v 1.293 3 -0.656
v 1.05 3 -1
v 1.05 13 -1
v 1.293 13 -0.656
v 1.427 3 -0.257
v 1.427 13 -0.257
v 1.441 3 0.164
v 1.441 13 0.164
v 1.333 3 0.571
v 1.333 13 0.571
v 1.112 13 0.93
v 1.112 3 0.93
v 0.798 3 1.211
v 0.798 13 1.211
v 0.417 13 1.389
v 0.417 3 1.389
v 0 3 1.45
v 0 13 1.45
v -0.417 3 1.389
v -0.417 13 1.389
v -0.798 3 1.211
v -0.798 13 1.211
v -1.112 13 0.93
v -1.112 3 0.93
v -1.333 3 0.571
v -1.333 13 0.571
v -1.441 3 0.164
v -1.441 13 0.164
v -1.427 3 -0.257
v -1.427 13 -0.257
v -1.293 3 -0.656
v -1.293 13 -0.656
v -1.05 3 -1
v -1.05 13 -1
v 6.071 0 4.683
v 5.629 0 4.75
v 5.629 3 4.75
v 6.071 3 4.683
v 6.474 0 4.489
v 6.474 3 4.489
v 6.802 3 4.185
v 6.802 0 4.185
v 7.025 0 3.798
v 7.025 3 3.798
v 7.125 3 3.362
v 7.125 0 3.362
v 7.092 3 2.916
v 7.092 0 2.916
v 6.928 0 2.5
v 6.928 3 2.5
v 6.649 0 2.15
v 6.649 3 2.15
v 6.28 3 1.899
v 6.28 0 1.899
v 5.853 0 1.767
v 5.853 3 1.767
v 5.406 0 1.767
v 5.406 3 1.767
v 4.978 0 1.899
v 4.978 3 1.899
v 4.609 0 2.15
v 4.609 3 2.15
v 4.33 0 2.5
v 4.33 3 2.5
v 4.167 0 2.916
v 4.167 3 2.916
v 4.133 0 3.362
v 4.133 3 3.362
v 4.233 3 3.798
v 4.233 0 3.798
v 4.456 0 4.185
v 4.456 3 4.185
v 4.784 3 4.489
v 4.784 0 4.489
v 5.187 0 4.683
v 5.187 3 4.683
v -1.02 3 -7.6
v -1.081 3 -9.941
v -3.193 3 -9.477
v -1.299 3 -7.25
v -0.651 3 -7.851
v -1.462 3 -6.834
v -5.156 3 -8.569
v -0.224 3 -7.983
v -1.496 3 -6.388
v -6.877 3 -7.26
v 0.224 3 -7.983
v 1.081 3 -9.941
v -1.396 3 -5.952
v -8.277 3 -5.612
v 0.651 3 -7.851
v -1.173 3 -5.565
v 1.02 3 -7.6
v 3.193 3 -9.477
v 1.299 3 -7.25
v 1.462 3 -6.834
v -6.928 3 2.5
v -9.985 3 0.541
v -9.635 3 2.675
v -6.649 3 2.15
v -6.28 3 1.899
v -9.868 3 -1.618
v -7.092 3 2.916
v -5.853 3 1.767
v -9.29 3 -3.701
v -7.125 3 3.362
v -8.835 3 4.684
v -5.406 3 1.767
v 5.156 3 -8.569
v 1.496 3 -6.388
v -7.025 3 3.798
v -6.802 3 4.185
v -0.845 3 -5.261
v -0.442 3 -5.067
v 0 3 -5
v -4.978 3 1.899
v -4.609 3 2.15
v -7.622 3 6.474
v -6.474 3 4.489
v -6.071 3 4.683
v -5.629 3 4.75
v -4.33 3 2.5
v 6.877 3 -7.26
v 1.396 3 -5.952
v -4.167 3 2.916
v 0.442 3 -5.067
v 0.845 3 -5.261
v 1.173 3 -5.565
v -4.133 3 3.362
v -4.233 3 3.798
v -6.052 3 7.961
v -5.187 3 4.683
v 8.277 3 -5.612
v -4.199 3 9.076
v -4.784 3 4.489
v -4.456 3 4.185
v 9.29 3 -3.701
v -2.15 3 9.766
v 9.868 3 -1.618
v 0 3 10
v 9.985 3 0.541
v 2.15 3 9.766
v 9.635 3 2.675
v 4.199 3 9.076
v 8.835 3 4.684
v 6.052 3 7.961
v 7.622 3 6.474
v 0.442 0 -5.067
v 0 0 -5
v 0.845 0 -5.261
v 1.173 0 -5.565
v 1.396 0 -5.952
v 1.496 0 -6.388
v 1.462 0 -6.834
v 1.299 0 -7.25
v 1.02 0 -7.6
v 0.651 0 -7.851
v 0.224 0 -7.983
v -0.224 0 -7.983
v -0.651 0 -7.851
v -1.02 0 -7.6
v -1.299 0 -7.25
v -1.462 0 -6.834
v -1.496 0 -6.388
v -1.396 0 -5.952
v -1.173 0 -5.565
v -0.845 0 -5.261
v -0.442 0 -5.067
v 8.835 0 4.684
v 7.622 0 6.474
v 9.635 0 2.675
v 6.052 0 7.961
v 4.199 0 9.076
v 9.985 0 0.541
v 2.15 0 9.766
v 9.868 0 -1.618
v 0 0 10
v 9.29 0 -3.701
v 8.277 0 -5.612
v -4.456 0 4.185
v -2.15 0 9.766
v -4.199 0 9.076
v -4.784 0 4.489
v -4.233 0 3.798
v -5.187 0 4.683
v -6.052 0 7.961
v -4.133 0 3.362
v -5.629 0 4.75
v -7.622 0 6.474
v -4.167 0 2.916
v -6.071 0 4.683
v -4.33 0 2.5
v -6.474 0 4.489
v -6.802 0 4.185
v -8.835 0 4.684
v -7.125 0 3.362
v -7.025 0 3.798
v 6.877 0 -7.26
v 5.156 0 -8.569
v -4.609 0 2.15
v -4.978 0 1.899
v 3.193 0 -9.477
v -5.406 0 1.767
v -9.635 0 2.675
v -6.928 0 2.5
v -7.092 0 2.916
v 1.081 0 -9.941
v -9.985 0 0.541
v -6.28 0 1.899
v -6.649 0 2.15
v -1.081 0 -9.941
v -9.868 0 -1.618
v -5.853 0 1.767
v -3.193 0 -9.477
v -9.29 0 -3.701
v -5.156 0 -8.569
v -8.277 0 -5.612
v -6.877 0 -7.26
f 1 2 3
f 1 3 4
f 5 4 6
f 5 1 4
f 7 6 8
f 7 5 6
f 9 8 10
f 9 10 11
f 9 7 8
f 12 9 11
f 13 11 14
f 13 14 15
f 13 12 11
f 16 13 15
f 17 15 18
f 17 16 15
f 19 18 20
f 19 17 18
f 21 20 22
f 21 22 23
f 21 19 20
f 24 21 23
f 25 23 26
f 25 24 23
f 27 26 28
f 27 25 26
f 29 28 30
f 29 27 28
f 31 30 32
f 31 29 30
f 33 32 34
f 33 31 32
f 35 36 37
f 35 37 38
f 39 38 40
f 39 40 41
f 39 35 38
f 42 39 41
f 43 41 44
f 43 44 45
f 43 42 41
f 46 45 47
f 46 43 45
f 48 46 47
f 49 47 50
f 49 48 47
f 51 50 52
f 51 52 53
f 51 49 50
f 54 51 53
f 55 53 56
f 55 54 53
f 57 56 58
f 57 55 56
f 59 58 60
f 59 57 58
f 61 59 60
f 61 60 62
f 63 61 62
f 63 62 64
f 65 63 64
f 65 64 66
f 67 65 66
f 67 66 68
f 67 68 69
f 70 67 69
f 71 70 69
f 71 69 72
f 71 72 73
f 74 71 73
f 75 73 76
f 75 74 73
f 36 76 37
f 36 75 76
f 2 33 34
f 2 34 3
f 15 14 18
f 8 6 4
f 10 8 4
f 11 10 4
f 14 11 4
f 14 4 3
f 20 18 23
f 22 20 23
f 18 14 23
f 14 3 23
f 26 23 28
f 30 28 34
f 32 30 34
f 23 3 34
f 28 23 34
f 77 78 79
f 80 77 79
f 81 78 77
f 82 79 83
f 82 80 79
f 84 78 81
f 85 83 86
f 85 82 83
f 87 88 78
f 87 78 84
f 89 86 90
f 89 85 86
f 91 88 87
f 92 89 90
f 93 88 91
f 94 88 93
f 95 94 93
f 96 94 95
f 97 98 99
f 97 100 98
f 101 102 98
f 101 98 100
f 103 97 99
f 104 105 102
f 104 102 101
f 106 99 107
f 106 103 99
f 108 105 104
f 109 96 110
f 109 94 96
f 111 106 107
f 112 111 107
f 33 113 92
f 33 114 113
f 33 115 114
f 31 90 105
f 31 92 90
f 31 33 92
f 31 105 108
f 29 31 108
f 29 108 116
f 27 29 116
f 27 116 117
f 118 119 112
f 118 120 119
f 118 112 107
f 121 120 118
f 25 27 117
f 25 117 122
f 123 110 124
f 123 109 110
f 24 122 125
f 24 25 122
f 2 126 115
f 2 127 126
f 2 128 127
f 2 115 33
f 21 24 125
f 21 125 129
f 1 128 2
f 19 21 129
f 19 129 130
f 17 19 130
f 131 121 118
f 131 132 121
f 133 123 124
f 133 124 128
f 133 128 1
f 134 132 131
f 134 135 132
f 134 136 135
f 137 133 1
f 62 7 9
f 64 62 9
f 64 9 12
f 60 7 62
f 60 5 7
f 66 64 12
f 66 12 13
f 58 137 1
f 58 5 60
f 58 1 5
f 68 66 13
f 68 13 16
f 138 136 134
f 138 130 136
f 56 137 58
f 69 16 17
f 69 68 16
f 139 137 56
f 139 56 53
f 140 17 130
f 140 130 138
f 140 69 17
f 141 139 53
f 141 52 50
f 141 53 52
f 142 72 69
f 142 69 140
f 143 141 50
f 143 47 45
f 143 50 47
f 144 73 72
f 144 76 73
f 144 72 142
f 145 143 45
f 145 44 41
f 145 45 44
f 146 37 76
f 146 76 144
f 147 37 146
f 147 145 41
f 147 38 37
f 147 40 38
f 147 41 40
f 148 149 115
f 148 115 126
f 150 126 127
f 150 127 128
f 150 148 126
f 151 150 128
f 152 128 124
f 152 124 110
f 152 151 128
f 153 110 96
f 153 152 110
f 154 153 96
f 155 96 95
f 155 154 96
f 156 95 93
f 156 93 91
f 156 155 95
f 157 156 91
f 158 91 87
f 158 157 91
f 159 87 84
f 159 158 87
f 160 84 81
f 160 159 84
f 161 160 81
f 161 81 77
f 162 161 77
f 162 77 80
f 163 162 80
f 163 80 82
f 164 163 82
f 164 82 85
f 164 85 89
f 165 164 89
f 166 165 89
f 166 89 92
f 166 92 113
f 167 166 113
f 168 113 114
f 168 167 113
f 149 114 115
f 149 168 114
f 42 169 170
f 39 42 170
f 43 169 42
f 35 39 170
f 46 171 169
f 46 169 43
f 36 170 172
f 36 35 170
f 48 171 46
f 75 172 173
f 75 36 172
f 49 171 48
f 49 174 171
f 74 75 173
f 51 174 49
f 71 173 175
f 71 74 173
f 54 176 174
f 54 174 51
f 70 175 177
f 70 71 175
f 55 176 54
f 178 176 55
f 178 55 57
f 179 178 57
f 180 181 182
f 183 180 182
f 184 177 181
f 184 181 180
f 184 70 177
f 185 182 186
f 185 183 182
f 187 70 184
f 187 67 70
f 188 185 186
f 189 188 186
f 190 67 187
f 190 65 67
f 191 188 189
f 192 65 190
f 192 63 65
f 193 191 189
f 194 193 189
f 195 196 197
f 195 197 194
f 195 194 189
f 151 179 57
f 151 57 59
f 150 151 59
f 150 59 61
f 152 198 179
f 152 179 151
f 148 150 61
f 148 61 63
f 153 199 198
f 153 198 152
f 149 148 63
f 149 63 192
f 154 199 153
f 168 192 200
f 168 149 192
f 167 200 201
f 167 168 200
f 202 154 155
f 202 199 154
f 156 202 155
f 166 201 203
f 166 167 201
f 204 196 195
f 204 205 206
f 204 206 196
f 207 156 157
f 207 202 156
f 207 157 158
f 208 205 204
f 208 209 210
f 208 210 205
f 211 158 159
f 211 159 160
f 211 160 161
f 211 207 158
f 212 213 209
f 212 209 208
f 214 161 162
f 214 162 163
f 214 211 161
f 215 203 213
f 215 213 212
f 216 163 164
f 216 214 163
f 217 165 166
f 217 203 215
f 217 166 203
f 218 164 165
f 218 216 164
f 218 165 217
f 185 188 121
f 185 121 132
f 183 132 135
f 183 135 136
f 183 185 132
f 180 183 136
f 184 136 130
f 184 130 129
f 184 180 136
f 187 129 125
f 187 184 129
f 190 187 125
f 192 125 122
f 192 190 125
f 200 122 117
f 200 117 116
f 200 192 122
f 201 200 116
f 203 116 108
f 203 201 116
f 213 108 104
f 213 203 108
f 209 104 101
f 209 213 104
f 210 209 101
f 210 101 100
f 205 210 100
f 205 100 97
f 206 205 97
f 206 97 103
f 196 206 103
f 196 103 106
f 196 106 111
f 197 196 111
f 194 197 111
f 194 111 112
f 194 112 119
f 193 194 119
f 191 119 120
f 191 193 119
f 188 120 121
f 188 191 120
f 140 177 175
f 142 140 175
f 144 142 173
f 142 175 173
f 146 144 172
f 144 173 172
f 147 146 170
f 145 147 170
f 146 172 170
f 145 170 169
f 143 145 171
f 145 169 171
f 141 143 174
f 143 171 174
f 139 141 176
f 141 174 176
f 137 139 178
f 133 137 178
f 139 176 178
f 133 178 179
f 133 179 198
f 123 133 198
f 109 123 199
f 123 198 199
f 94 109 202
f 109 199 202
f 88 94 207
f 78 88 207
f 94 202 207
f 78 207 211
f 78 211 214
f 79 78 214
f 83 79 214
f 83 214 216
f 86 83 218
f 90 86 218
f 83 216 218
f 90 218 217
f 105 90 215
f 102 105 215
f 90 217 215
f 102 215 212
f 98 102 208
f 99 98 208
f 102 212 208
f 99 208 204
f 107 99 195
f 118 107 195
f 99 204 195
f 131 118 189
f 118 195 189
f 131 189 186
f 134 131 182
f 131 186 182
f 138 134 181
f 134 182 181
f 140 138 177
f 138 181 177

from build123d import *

# Parameters (mm, degrees)
SKETCH_1_R      = 10
SKETCH_1_R_2    = 1.5
EXTRUDE_1_DEPTH = 3
EXTRUDE_2_DEPTH = 13


with BuildPart() as part:
    # 草图1 → 凸台-拉伸1 (new body)
    with BuildSketch(Plane(origin=(0, 0, 0), x_dir=(1, 0, 0), z_dir=(0, 1, 0))):
        with Locations(Location((0, 0, 0), (0, 0, 270))):
            Circle(SKETCH_1_R)
        with Locations(Location((0, 6.5, 0), (0, 0, 270))):
            Circle(SKETCH_1_R_2, mode=Mode.SUBTRACT)
        with Locations(Location((5.629165125, -3.25, 0), (0, 0, 270))):
            Circle(SKETCH_1_R_2, mode=Mode.SUBTRACT)
        with Locations(Location((-5.629165125, -3.25, 0), (0, 0, 270))):
            Circle(SKETCH_1_R_2, mode=Mode.SUBTRACT)
    extrude(amount=EXTRUDE_1_DEPTH)

    # 草图2 → 凸台-拉伸2 (add)
    with BuildSketch(Plane(origin=(0, 0, 0), x_dir=(1, 0, 0), z_dir=(0, 1, 0))):
        with BuildLine():
            Line((-1.05, 1), (1.05, 1))
            ThreePointArc((1.05, 1), (0, -1.45), (-1.05, 1))
        make_face()
    extrude(amount=EXTRUDE_2_DEPTH)


solid = part.part
